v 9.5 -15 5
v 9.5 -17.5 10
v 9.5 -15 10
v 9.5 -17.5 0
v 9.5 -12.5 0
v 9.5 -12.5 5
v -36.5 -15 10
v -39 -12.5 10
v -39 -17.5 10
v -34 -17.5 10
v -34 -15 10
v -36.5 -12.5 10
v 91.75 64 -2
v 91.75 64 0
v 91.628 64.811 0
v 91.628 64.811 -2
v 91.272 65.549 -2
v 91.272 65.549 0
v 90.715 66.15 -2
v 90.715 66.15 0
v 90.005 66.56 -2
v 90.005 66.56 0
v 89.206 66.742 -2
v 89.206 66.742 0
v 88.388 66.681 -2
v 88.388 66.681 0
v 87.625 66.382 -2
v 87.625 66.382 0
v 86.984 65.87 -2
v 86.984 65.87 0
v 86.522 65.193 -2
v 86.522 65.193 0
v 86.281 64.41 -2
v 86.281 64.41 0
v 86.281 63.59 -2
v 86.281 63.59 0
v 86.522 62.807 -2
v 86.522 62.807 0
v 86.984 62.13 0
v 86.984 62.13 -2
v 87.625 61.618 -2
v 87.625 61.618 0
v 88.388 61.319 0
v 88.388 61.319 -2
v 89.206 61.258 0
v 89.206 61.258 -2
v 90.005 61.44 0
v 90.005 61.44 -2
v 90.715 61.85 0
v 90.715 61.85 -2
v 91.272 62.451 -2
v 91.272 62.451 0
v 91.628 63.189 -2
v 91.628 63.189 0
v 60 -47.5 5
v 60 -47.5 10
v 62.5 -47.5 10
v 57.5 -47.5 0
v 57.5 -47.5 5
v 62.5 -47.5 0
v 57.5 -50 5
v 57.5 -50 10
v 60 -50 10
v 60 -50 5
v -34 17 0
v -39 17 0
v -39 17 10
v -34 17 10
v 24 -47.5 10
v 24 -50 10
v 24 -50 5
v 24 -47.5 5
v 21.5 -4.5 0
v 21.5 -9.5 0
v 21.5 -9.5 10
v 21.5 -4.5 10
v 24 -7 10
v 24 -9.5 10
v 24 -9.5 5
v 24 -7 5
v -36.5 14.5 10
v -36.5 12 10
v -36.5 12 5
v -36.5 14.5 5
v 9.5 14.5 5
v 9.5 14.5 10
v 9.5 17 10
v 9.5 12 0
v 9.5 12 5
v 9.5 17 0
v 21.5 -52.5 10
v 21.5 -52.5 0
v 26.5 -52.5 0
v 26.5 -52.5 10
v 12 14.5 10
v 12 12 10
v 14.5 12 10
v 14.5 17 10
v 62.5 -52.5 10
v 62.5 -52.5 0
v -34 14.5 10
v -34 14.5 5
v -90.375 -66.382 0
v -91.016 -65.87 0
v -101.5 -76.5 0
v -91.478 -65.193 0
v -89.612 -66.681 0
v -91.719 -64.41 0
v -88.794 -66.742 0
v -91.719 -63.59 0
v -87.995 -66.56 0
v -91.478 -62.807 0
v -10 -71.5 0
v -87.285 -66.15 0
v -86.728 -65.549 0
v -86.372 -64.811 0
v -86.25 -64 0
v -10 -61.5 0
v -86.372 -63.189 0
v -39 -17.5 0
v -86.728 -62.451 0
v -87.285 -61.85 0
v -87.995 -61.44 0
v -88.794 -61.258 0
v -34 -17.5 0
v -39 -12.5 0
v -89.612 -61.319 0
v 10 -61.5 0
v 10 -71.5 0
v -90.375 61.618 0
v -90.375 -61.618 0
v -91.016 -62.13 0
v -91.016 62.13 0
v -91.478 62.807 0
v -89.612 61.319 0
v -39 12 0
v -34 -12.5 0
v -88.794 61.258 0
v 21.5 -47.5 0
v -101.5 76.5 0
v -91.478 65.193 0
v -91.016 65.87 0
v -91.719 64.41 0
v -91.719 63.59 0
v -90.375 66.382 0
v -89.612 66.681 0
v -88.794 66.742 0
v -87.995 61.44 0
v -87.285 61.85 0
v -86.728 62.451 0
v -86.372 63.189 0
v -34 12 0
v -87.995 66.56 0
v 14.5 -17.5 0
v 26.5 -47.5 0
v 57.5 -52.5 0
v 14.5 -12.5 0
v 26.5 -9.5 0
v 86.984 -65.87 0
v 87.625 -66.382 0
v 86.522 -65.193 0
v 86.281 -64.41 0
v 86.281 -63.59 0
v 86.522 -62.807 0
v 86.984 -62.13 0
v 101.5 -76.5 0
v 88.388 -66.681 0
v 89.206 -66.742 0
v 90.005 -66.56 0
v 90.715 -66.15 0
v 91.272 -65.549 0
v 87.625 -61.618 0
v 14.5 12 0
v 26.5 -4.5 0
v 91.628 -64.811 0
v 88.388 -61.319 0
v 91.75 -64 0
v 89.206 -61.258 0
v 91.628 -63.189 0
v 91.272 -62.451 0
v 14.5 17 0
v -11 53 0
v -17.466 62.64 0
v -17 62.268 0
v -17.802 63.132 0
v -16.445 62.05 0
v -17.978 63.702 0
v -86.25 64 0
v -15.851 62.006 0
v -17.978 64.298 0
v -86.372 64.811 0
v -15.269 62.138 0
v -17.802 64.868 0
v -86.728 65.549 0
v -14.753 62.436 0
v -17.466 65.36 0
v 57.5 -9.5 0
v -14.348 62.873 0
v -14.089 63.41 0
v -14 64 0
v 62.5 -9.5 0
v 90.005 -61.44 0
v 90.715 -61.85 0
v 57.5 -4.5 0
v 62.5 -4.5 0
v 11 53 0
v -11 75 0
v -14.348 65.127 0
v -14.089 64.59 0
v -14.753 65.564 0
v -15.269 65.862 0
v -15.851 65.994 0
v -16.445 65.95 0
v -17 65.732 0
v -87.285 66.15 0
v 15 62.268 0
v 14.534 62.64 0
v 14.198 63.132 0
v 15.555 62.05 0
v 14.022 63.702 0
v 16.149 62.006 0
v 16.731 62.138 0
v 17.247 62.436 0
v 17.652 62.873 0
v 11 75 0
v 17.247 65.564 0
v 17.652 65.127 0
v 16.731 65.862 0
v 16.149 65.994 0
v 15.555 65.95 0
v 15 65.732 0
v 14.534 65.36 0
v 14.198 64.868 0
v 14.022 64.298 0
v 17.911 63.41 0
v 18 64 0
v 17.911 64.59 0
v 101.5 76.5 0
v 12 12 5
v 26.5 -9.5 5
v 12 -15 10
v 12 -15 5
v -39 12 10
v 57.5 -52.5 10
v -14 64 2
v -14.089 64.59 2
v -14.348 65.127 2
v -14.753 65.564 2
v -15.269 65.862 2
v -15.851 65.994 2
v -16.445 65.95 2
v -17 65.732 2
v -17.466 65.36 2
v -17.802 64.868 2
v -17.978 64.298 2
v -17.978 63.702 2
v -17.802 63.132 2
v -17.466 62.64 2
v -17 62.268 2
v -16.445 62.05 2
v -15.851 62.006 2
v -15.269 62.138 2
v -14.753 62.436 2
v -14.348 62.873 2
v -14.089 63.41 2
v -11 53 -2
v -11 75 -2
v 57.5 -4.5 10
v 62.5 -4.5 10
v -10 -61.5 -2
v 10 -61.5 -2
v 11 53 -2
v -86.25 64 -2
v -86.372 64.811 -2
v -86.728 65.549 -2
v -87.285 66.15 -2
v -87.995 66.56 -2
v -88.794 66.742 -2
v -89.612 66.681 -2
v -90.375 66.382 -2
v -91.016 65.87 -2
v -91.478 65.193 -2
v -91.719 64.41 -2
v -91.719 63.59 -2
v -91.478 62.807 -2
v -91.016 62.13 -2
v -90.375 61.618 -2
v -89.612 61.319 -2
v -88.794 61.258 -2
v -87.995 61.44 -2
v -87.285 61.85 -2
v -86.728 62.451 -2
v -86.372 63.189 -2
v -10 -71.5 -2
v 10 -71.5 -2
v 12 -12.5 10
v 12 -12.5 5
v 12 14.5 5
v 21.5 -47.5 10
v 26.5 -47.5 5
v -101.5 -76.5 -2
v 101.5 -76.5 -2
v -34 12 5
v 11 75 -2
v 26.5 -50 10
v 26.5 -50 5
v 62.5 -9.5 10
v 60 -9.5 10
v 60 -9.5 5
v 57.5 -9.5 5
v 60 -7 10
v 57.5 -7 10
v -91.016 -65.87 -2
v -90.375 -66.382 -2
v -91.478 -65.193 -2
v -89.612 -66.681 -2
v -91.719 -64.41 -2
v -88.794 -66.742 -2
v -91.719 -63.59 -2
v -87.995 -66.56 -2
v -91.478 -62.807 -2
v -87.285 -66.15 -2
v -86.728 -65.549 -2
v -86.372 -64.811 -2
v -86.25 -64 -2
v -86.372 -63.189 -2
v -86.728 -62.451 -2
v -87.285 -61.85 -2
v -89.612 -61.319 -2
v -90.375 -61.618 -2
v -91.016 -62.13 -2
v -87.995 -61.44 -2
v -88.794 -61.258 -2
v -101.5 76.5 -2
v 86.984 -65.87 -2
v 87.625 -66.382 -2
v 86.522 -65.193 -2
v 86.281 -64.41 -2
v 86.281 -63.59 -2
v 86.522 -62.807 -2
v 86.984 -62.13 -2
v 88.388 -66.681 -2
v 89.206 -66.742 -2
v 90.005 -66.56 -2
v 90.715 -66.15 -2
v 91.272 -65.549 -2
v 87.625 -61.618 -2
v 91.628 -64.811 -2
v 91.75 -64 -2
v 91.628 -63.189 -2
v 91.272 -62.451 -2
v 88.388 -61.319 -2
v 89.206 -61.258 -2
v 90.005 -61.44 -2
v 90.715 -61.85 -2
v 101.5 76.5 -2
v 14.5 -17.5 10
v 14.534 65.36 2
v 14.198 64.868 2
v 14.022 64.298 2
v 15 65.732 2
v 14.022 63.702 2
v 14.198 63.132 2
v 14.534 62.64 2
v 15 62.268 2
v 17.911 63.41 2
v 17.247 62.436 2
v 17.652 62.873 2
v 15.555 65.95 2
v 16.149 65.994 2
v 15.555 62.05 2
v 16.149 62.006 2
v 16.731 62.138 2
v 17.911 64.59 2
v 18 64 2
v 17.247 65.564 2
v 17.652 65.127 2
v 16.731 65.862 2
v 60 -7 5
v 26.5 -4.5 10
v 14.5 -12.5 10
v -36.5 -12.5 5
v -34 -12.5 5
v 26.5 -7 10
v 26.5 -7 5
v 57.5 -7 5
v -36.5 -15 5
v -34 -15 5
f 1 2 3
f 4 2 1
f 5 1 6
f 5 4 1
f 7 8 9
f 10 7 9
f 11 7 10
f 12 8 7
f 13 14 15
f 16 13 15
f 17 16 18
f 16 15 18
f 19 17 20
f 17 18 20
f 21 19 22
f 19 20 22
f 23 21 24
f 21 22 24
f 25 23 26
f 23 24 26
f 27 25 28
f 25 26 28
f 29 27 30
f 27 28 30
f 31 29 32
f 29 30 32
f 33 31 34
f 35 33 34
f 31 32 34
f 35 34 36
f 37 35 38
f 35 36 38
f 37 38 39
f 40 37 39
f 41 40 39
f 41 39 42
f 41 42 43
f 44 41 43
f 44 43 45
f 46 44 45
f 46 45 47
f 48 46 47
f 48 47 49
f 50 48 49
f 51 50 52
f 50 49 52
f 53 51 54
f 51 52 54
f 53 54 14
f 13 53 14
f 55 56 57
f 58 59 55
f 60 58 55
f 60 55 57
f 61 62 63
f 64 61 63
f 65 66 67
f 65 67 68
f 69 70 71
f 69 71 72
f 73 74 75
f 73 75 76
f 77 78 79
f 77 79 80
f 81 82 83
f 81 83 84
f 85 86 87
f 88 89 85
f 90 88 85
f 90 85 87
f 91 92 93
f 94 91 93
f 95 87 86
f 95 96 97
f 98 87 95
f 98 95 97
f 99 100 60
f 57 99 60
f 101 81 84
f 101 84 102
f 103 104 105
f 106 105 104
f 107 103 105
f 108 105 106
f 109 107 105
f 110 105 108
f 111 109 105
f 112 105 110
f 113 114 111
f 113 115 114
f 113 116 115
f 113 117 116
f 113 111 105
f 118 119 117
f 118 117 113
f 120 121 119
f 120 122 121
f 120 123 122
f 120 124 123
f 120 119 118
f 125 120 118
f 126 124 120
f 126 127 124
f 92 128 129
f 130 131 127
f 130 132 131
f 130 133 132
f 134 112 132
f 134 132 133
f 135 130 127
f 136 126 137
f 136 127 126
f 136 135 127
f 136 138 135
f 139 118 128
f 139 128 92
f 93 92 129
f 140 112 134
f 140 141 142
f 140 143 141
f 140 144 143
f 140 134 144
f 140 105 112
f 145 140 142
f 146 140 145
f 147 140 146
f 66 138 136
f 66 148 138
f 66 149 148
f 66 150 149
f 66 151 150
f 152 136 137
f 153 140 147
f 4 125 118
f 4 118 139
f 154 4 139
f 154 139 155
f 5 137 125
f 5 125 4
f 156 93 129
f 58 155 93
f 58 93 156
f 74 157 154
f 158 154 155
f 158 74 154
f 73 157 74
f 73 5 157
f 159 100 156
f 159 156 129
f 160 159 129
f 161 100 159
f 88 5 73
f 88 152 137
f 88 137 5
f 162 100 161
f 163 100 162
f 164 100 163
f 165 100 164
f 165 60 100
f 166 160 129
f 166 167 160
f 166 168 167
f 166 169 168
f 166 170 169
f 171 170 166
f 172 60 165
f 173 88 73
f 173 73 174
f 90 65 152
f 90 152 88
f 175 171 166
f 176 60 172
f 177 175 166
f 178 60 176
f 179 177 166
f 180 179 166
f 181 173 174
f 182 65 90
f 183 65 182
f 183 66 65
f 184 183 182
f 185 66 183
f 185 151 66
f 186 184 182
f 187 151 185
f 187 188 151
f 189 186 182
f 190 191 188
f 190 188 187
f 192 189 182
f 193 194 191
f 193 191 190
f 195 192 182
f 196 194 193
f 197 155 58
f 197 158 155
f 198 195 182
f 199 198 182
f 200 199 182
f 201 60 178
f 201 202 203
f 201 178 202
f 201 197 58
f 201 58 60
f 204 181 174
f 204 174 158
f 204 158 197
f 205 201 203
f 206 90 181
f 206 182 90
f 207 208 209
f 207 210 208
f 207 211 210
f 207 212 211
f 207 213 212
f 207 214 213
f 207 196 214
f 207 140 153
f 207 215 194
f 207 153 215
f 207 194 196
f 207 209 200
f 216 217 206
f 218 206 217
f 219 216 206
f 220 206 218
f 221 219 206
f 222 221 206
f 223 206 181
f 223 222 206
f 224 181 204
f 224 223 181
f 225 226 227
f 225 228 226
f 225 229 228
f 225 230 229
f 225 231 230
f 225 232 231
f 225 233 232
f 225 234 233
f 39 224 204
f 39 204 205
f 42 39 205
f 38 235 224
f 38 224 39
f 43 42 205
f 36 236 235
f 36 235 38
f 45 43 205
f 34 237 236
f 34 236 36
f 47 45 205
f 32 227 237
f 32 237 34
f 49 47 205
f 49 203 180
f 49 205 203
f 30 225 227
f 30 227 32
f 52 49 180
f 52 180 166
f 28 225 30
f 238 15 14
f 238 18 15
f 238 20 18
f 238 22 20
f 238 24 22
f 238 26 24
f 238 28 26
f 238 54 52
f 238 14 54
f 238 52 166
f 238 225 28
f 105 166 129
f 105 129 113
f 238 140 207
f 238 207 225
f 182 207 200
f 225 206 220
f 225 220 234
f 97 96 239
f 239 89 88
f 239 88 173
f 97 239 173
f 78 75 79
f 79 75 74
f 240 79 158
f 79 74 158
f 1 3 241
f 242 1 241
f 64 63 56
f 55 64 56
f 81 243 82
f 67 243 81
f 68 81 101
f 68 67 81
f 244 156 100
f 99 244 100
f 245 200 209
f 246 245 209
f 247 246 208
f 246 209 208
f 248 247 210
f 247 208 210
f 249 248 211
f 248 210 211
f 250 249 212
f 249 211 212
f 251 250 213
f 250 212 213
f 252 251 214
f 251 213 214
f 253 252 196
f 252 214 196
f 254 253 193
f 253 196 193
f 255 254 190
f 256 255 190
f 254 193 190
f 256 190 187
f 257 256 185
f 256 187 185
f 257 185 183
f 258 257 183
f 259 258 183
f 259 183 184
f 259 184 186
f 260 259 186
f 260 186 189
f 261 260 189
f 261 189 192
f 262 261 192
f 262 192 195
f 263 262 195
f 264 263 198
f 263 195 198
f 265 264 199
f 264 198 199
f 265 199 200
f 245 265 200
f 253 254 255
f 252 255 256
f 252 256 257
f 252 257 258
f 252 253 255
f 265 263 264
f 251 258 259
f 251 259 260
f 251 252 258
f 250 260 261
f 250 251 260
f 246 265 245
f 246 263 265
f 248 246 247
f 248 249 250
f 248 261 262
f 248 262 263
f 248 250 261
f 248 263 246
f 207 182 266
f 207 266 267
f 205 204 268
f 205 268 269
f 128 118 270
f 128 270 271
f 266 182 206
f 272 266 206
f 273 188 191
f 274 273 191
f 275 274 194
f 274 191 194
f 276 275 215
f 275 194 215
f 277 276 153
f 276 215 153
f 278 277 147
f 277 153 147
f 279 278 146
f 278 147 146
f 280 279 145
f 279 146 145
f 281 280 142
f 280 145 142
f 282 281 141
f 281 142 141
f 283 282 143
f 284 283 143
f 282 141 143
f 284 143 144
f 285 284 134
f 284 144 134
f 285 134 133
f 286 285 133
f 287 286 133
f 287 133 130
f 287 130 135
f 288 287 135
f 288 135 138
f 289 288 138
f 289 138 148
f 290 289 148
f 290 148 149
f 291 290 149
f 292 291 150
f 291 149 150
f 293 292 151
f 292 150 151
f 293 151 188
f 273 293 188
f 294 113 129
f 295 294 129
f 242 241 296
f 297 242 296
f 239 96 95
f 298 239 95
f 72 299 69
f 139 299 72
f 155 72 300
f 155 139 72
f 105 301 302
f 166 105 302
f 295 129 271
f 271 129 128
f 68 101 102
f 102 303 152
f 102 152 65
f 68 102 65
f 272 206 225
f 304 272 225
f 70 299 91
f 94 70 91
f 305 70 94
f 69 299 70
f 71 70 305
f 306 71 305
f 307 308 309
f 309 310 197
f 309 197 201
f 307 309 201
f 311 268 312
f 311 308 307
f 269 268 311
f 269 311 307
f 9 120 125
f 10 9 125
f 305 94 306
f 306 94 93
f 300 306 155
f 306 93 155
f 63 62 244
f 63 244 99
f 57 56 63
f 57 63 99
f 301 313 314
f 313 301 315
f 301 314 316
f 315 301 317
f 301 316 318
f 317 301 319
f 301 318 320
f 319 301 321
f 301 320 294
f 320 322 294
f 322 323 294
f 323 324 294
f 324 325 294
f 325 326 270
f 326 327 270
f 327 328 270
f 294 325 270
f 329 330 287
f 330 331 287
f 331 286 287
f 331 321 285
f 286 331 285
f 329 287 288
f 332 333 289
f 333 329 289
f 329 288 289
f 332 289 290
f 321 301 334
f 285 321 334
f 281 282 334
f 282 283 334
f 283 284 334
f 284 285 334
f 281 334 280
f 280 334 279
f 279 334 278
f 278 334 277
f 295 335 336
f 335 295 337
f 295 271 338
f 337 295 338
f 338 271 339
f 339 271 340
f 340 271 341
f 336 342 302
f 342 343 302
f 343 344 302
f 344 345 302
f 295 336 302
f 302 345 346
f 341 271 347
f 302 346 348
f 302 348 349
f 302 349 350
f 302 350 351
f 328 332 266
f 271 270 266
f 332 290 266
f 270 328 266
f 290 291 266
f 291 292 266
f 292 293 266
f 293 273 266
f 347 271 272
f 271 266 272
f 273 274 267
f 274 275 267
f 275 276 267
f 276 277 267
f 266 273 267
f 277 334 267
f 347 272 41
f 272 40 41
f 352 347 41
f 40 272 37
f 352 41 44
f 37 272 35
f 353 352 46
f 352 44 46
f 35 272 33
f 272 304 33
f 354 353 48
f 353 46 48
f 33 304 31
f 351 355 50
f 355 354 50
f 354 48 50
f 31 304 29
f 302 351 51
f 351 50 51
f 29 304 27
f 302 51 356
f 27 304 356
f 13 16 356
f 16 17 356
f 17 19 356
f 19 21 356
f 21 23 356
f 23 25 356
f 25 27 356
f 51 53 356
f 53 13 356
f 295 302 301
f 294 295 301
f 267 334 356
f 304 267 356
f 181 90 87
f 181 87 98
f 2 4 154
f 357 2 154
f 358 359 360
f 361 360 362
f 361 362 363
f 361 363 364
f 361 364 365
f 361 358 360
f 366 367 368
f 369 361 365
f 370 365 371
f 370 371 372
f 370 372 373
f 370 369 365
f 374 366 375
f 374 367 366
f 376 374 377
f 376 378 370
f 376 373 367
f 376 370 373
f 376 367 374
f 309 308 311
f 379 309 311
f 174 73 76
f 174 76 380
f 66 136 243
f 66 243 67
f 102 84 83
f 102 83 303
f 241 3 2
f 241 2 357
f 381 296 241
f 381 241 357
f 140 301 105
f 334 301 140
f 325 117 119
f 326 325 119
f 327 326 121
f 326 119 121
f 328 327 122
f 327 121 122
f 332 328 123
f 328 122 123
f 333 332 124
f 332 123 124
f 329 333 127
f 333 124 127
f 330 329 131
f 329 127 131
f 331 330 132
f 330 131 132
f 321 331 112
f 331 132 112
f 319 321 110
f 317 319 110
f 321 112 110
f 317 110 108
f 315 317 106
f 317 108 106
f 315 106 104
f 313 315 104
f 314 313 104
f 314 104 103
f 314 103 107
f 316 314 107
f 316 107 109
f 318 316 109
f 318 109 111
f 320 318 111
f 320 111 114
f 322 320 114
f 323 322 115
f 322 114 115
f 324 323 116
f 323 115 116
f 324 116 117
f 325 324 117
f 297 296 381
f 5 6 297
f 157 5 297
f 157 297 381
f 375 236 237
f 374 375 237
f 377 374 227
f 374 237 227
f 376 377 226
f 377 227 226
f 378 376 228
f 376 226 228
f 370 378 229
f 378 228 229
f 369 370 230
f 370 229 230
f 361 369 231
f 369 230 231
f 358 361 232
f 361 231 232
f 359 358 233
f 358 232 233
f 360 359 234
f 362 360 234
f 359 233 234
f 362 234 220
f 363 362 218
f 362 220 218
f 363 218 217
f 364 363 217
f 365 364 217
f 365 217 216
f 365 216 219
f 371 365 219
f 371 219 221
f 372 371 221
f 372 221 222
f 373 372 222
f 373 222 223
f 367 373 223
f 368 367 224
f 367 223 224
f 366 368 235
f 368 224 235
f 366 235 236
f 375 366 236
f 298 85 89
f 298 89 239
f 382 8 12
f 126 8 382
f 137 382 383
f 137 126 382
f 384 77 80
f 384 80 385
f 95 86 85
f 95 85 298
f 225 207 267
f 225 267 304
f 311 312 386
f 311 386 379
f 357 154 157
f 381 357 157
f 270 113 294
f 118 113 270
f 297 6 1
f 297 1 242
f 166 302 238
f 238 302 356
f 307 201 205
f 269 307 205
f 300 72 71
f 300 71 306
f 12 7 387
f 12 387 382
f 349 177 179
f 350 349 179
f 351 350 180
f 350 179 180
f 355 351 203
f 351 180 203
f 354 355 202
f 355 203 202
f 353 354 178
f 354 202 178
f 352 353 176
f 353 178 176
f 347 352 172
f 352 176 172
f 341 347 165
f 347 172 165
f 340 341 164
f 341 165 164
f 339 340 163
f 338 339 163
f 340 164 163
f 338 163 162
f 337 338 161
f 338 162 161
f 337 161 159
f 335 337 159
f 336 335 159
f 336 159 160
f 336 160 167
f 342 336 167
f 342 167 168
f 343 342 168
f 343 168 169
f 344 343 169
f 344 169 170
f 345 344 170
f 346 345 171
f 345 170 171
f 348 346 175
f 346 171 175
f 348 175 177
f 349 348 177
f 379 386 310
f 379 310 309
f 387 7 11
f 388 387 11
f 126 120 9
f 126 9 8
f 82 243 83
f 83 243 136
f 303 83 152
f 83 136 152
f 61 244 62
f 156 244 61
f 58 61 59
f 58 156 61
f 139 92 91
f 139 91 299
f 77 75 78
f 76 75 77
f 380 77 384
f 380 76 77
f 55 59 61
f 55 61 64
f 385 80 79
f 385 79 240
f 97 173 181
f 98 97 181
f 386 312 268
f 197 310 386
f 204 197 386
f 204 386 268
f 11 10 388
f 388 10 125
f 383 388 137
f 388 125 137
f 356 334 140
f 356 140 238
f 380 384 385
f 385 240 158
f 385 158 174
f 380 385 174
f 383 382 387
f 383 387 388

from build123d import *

# Parameters (mm, degrees)
SKETCH_W        = 203
SKETCH_H        = 153
PAD_DEPTH       = 2
SKETCH002_W     = 20
SKETCH002_H     = 10
SKETCH002_W_2   = 22
SKETCH002_H_2   = 22
POCKET001_DEPTH = 2
SKETCH001_R     = 2.75
POCKET_DEPTH    = 2
SKETCH003_R     = 2
PAD001_DEPTH    = 2
SKETCH005_W     = 5
SKETCH005_H     = 5
PAD003_DEPTH    = 10
SKETCH006_W     = 2.5
SKETCH006_H     = 2.5
POCKET002_DEPTH = 5
SKETCH007_W     = 5
SKETCH007_H     = 5
PAD004_DEPTH    = 10
SKETCH008_W     = 2.5
SKETCH008_H     = 2.5
POCKET003_DEPTH = 5


with BuildPart() as part:
    # Sketch (on DatumPlane) → Pad (new body)
    with BuildSketch(Plane.XY.offset(-2)):
        Rectangle(SKETCH_W, SKETCH_H)
    extrude(amount=PAD_DEPTH)

    # Sketch002 (on DatumPlane) → Pocket001 (cut)
    with BuildSketch(Plane.XY):
        with Locations((0, -66.5)):
            Rectangle(SKETCH002_W, SKETCH002_H)
        with Locations((0, 64)):
            Rectangle(SKETCH002_W_2, SKETCH002_H_2)
    extrude(amount=-POCKET001_DEPTH, mode=Mode.SUBTRACT)

    # Sketch001 (on DatumPlane) → Pocket (cut)
    with BuildSketch(Plane.XY):
        with Locations((89, 64)):
            Circle(SKETCH001_R)
        with Locations((89, -64)):
            Circle(SKETCH001_R)
        with Locations((-89, -64)):
            Circle(SKETCH001_R)
        with Locations((-89, 64)):
            Circle(SKETCH001_R)
    extrude(amount=-POCKET_DEPTH, mode=Mode.SUBTRACT)

    # Sketch003 (on DatumPlane) → Pad001 (join)
    with BuildSketch(Plane.XY):
        with Locations((-16, 64)):
            Circle(SKETCH003_R)
        with Locations((16, 64)):
            Circle(SKETCH003_R)
    extrude(amount=PAD001_DEPTH)

    # Sketch005 (on DatumPlane) → Pad003 (join)
    with BuildSketch(Plane.XY):
        with Locations((-36.5, 14.5)):
            Rectangle(SKETCH005_W, SKETCH005_H)
        with Locations((12, 14.5)):
            Rectangle(SKETCH005_W, SKETCH005_H)
        with Locations((-36.5, -15)):
            Rectangle(SKETCH005_W, SKETCH005_H)
        with Locations((12, -15)):
            Rectangle(SKETCH005_W, SKETCH005_H)
    extrude(amount=PAD003_DEPTH)

    # Sketch006 (on Face39 of Pad003) → Pocket002 (cut)
    with BuildSketch(Plane.XY.offset(10)):
        with Locations((-35.25, 13.25)):
            Rectangle(SKETCH006_W, SKETCH006_H)
        with Locations((10.75, 13.25)):
            Rectangle(SKETCH006_W, SKETCH006_H)
        with Locations((10.75, -13.75)):
            Rectangle(SKETCH006_W, SKETCH006_H)
        with Locations((-35.25, -13.75)):
            Rectangle(SKETCH006_W, SKETCH006_H)
    extrude(amount=-POCKET002_DEPTH, mode=Mode.SUBTRACT)

    # Sketch007 (on DatumPlane) → Pad004 (join)
    with BuildSketch(Plane.XY):
        with Locations((24, -7)):
            Rectangle(SKETCH007_W, SKETCH007_H)
        with Locations((60, -7)):
            Rectangle(SKETCH007_W, SKETCH007_H)
        with Locations((24, -50)):
            Rectangle(SKETCH007_W, SKETCH007_H)
        with Locations((60, -50)):
            Rectangle(SKETCH007_W, SKETCH007_H)
    extrude(amount=PAD004_DEPTH)

    # Sketch008 (on Face63 of Pad004) → Pocket003 (cut)
    with BuildSketch(Plane.XY.offset(10)):
        with Locations((25.25, -8.25)):
            Rectangle(SKETCH008_W, SKETCH008_H)
        with Locations((58.75, -8.25)):
            Rectangle(SKETCH008_W, SKETCH008_H)
        with Locations((25.25, -48.75)):
            Rectangle(SKETCH008_W, SKETCH008_H)
        with Locations((58.75, -48.75)):
            Rectangle(SKETCH008_W, SKETCH008_H)
    extrude(amount=-POCKET003_DEPTH, mode=Mode.SUBTRACT)


solid = part.part
